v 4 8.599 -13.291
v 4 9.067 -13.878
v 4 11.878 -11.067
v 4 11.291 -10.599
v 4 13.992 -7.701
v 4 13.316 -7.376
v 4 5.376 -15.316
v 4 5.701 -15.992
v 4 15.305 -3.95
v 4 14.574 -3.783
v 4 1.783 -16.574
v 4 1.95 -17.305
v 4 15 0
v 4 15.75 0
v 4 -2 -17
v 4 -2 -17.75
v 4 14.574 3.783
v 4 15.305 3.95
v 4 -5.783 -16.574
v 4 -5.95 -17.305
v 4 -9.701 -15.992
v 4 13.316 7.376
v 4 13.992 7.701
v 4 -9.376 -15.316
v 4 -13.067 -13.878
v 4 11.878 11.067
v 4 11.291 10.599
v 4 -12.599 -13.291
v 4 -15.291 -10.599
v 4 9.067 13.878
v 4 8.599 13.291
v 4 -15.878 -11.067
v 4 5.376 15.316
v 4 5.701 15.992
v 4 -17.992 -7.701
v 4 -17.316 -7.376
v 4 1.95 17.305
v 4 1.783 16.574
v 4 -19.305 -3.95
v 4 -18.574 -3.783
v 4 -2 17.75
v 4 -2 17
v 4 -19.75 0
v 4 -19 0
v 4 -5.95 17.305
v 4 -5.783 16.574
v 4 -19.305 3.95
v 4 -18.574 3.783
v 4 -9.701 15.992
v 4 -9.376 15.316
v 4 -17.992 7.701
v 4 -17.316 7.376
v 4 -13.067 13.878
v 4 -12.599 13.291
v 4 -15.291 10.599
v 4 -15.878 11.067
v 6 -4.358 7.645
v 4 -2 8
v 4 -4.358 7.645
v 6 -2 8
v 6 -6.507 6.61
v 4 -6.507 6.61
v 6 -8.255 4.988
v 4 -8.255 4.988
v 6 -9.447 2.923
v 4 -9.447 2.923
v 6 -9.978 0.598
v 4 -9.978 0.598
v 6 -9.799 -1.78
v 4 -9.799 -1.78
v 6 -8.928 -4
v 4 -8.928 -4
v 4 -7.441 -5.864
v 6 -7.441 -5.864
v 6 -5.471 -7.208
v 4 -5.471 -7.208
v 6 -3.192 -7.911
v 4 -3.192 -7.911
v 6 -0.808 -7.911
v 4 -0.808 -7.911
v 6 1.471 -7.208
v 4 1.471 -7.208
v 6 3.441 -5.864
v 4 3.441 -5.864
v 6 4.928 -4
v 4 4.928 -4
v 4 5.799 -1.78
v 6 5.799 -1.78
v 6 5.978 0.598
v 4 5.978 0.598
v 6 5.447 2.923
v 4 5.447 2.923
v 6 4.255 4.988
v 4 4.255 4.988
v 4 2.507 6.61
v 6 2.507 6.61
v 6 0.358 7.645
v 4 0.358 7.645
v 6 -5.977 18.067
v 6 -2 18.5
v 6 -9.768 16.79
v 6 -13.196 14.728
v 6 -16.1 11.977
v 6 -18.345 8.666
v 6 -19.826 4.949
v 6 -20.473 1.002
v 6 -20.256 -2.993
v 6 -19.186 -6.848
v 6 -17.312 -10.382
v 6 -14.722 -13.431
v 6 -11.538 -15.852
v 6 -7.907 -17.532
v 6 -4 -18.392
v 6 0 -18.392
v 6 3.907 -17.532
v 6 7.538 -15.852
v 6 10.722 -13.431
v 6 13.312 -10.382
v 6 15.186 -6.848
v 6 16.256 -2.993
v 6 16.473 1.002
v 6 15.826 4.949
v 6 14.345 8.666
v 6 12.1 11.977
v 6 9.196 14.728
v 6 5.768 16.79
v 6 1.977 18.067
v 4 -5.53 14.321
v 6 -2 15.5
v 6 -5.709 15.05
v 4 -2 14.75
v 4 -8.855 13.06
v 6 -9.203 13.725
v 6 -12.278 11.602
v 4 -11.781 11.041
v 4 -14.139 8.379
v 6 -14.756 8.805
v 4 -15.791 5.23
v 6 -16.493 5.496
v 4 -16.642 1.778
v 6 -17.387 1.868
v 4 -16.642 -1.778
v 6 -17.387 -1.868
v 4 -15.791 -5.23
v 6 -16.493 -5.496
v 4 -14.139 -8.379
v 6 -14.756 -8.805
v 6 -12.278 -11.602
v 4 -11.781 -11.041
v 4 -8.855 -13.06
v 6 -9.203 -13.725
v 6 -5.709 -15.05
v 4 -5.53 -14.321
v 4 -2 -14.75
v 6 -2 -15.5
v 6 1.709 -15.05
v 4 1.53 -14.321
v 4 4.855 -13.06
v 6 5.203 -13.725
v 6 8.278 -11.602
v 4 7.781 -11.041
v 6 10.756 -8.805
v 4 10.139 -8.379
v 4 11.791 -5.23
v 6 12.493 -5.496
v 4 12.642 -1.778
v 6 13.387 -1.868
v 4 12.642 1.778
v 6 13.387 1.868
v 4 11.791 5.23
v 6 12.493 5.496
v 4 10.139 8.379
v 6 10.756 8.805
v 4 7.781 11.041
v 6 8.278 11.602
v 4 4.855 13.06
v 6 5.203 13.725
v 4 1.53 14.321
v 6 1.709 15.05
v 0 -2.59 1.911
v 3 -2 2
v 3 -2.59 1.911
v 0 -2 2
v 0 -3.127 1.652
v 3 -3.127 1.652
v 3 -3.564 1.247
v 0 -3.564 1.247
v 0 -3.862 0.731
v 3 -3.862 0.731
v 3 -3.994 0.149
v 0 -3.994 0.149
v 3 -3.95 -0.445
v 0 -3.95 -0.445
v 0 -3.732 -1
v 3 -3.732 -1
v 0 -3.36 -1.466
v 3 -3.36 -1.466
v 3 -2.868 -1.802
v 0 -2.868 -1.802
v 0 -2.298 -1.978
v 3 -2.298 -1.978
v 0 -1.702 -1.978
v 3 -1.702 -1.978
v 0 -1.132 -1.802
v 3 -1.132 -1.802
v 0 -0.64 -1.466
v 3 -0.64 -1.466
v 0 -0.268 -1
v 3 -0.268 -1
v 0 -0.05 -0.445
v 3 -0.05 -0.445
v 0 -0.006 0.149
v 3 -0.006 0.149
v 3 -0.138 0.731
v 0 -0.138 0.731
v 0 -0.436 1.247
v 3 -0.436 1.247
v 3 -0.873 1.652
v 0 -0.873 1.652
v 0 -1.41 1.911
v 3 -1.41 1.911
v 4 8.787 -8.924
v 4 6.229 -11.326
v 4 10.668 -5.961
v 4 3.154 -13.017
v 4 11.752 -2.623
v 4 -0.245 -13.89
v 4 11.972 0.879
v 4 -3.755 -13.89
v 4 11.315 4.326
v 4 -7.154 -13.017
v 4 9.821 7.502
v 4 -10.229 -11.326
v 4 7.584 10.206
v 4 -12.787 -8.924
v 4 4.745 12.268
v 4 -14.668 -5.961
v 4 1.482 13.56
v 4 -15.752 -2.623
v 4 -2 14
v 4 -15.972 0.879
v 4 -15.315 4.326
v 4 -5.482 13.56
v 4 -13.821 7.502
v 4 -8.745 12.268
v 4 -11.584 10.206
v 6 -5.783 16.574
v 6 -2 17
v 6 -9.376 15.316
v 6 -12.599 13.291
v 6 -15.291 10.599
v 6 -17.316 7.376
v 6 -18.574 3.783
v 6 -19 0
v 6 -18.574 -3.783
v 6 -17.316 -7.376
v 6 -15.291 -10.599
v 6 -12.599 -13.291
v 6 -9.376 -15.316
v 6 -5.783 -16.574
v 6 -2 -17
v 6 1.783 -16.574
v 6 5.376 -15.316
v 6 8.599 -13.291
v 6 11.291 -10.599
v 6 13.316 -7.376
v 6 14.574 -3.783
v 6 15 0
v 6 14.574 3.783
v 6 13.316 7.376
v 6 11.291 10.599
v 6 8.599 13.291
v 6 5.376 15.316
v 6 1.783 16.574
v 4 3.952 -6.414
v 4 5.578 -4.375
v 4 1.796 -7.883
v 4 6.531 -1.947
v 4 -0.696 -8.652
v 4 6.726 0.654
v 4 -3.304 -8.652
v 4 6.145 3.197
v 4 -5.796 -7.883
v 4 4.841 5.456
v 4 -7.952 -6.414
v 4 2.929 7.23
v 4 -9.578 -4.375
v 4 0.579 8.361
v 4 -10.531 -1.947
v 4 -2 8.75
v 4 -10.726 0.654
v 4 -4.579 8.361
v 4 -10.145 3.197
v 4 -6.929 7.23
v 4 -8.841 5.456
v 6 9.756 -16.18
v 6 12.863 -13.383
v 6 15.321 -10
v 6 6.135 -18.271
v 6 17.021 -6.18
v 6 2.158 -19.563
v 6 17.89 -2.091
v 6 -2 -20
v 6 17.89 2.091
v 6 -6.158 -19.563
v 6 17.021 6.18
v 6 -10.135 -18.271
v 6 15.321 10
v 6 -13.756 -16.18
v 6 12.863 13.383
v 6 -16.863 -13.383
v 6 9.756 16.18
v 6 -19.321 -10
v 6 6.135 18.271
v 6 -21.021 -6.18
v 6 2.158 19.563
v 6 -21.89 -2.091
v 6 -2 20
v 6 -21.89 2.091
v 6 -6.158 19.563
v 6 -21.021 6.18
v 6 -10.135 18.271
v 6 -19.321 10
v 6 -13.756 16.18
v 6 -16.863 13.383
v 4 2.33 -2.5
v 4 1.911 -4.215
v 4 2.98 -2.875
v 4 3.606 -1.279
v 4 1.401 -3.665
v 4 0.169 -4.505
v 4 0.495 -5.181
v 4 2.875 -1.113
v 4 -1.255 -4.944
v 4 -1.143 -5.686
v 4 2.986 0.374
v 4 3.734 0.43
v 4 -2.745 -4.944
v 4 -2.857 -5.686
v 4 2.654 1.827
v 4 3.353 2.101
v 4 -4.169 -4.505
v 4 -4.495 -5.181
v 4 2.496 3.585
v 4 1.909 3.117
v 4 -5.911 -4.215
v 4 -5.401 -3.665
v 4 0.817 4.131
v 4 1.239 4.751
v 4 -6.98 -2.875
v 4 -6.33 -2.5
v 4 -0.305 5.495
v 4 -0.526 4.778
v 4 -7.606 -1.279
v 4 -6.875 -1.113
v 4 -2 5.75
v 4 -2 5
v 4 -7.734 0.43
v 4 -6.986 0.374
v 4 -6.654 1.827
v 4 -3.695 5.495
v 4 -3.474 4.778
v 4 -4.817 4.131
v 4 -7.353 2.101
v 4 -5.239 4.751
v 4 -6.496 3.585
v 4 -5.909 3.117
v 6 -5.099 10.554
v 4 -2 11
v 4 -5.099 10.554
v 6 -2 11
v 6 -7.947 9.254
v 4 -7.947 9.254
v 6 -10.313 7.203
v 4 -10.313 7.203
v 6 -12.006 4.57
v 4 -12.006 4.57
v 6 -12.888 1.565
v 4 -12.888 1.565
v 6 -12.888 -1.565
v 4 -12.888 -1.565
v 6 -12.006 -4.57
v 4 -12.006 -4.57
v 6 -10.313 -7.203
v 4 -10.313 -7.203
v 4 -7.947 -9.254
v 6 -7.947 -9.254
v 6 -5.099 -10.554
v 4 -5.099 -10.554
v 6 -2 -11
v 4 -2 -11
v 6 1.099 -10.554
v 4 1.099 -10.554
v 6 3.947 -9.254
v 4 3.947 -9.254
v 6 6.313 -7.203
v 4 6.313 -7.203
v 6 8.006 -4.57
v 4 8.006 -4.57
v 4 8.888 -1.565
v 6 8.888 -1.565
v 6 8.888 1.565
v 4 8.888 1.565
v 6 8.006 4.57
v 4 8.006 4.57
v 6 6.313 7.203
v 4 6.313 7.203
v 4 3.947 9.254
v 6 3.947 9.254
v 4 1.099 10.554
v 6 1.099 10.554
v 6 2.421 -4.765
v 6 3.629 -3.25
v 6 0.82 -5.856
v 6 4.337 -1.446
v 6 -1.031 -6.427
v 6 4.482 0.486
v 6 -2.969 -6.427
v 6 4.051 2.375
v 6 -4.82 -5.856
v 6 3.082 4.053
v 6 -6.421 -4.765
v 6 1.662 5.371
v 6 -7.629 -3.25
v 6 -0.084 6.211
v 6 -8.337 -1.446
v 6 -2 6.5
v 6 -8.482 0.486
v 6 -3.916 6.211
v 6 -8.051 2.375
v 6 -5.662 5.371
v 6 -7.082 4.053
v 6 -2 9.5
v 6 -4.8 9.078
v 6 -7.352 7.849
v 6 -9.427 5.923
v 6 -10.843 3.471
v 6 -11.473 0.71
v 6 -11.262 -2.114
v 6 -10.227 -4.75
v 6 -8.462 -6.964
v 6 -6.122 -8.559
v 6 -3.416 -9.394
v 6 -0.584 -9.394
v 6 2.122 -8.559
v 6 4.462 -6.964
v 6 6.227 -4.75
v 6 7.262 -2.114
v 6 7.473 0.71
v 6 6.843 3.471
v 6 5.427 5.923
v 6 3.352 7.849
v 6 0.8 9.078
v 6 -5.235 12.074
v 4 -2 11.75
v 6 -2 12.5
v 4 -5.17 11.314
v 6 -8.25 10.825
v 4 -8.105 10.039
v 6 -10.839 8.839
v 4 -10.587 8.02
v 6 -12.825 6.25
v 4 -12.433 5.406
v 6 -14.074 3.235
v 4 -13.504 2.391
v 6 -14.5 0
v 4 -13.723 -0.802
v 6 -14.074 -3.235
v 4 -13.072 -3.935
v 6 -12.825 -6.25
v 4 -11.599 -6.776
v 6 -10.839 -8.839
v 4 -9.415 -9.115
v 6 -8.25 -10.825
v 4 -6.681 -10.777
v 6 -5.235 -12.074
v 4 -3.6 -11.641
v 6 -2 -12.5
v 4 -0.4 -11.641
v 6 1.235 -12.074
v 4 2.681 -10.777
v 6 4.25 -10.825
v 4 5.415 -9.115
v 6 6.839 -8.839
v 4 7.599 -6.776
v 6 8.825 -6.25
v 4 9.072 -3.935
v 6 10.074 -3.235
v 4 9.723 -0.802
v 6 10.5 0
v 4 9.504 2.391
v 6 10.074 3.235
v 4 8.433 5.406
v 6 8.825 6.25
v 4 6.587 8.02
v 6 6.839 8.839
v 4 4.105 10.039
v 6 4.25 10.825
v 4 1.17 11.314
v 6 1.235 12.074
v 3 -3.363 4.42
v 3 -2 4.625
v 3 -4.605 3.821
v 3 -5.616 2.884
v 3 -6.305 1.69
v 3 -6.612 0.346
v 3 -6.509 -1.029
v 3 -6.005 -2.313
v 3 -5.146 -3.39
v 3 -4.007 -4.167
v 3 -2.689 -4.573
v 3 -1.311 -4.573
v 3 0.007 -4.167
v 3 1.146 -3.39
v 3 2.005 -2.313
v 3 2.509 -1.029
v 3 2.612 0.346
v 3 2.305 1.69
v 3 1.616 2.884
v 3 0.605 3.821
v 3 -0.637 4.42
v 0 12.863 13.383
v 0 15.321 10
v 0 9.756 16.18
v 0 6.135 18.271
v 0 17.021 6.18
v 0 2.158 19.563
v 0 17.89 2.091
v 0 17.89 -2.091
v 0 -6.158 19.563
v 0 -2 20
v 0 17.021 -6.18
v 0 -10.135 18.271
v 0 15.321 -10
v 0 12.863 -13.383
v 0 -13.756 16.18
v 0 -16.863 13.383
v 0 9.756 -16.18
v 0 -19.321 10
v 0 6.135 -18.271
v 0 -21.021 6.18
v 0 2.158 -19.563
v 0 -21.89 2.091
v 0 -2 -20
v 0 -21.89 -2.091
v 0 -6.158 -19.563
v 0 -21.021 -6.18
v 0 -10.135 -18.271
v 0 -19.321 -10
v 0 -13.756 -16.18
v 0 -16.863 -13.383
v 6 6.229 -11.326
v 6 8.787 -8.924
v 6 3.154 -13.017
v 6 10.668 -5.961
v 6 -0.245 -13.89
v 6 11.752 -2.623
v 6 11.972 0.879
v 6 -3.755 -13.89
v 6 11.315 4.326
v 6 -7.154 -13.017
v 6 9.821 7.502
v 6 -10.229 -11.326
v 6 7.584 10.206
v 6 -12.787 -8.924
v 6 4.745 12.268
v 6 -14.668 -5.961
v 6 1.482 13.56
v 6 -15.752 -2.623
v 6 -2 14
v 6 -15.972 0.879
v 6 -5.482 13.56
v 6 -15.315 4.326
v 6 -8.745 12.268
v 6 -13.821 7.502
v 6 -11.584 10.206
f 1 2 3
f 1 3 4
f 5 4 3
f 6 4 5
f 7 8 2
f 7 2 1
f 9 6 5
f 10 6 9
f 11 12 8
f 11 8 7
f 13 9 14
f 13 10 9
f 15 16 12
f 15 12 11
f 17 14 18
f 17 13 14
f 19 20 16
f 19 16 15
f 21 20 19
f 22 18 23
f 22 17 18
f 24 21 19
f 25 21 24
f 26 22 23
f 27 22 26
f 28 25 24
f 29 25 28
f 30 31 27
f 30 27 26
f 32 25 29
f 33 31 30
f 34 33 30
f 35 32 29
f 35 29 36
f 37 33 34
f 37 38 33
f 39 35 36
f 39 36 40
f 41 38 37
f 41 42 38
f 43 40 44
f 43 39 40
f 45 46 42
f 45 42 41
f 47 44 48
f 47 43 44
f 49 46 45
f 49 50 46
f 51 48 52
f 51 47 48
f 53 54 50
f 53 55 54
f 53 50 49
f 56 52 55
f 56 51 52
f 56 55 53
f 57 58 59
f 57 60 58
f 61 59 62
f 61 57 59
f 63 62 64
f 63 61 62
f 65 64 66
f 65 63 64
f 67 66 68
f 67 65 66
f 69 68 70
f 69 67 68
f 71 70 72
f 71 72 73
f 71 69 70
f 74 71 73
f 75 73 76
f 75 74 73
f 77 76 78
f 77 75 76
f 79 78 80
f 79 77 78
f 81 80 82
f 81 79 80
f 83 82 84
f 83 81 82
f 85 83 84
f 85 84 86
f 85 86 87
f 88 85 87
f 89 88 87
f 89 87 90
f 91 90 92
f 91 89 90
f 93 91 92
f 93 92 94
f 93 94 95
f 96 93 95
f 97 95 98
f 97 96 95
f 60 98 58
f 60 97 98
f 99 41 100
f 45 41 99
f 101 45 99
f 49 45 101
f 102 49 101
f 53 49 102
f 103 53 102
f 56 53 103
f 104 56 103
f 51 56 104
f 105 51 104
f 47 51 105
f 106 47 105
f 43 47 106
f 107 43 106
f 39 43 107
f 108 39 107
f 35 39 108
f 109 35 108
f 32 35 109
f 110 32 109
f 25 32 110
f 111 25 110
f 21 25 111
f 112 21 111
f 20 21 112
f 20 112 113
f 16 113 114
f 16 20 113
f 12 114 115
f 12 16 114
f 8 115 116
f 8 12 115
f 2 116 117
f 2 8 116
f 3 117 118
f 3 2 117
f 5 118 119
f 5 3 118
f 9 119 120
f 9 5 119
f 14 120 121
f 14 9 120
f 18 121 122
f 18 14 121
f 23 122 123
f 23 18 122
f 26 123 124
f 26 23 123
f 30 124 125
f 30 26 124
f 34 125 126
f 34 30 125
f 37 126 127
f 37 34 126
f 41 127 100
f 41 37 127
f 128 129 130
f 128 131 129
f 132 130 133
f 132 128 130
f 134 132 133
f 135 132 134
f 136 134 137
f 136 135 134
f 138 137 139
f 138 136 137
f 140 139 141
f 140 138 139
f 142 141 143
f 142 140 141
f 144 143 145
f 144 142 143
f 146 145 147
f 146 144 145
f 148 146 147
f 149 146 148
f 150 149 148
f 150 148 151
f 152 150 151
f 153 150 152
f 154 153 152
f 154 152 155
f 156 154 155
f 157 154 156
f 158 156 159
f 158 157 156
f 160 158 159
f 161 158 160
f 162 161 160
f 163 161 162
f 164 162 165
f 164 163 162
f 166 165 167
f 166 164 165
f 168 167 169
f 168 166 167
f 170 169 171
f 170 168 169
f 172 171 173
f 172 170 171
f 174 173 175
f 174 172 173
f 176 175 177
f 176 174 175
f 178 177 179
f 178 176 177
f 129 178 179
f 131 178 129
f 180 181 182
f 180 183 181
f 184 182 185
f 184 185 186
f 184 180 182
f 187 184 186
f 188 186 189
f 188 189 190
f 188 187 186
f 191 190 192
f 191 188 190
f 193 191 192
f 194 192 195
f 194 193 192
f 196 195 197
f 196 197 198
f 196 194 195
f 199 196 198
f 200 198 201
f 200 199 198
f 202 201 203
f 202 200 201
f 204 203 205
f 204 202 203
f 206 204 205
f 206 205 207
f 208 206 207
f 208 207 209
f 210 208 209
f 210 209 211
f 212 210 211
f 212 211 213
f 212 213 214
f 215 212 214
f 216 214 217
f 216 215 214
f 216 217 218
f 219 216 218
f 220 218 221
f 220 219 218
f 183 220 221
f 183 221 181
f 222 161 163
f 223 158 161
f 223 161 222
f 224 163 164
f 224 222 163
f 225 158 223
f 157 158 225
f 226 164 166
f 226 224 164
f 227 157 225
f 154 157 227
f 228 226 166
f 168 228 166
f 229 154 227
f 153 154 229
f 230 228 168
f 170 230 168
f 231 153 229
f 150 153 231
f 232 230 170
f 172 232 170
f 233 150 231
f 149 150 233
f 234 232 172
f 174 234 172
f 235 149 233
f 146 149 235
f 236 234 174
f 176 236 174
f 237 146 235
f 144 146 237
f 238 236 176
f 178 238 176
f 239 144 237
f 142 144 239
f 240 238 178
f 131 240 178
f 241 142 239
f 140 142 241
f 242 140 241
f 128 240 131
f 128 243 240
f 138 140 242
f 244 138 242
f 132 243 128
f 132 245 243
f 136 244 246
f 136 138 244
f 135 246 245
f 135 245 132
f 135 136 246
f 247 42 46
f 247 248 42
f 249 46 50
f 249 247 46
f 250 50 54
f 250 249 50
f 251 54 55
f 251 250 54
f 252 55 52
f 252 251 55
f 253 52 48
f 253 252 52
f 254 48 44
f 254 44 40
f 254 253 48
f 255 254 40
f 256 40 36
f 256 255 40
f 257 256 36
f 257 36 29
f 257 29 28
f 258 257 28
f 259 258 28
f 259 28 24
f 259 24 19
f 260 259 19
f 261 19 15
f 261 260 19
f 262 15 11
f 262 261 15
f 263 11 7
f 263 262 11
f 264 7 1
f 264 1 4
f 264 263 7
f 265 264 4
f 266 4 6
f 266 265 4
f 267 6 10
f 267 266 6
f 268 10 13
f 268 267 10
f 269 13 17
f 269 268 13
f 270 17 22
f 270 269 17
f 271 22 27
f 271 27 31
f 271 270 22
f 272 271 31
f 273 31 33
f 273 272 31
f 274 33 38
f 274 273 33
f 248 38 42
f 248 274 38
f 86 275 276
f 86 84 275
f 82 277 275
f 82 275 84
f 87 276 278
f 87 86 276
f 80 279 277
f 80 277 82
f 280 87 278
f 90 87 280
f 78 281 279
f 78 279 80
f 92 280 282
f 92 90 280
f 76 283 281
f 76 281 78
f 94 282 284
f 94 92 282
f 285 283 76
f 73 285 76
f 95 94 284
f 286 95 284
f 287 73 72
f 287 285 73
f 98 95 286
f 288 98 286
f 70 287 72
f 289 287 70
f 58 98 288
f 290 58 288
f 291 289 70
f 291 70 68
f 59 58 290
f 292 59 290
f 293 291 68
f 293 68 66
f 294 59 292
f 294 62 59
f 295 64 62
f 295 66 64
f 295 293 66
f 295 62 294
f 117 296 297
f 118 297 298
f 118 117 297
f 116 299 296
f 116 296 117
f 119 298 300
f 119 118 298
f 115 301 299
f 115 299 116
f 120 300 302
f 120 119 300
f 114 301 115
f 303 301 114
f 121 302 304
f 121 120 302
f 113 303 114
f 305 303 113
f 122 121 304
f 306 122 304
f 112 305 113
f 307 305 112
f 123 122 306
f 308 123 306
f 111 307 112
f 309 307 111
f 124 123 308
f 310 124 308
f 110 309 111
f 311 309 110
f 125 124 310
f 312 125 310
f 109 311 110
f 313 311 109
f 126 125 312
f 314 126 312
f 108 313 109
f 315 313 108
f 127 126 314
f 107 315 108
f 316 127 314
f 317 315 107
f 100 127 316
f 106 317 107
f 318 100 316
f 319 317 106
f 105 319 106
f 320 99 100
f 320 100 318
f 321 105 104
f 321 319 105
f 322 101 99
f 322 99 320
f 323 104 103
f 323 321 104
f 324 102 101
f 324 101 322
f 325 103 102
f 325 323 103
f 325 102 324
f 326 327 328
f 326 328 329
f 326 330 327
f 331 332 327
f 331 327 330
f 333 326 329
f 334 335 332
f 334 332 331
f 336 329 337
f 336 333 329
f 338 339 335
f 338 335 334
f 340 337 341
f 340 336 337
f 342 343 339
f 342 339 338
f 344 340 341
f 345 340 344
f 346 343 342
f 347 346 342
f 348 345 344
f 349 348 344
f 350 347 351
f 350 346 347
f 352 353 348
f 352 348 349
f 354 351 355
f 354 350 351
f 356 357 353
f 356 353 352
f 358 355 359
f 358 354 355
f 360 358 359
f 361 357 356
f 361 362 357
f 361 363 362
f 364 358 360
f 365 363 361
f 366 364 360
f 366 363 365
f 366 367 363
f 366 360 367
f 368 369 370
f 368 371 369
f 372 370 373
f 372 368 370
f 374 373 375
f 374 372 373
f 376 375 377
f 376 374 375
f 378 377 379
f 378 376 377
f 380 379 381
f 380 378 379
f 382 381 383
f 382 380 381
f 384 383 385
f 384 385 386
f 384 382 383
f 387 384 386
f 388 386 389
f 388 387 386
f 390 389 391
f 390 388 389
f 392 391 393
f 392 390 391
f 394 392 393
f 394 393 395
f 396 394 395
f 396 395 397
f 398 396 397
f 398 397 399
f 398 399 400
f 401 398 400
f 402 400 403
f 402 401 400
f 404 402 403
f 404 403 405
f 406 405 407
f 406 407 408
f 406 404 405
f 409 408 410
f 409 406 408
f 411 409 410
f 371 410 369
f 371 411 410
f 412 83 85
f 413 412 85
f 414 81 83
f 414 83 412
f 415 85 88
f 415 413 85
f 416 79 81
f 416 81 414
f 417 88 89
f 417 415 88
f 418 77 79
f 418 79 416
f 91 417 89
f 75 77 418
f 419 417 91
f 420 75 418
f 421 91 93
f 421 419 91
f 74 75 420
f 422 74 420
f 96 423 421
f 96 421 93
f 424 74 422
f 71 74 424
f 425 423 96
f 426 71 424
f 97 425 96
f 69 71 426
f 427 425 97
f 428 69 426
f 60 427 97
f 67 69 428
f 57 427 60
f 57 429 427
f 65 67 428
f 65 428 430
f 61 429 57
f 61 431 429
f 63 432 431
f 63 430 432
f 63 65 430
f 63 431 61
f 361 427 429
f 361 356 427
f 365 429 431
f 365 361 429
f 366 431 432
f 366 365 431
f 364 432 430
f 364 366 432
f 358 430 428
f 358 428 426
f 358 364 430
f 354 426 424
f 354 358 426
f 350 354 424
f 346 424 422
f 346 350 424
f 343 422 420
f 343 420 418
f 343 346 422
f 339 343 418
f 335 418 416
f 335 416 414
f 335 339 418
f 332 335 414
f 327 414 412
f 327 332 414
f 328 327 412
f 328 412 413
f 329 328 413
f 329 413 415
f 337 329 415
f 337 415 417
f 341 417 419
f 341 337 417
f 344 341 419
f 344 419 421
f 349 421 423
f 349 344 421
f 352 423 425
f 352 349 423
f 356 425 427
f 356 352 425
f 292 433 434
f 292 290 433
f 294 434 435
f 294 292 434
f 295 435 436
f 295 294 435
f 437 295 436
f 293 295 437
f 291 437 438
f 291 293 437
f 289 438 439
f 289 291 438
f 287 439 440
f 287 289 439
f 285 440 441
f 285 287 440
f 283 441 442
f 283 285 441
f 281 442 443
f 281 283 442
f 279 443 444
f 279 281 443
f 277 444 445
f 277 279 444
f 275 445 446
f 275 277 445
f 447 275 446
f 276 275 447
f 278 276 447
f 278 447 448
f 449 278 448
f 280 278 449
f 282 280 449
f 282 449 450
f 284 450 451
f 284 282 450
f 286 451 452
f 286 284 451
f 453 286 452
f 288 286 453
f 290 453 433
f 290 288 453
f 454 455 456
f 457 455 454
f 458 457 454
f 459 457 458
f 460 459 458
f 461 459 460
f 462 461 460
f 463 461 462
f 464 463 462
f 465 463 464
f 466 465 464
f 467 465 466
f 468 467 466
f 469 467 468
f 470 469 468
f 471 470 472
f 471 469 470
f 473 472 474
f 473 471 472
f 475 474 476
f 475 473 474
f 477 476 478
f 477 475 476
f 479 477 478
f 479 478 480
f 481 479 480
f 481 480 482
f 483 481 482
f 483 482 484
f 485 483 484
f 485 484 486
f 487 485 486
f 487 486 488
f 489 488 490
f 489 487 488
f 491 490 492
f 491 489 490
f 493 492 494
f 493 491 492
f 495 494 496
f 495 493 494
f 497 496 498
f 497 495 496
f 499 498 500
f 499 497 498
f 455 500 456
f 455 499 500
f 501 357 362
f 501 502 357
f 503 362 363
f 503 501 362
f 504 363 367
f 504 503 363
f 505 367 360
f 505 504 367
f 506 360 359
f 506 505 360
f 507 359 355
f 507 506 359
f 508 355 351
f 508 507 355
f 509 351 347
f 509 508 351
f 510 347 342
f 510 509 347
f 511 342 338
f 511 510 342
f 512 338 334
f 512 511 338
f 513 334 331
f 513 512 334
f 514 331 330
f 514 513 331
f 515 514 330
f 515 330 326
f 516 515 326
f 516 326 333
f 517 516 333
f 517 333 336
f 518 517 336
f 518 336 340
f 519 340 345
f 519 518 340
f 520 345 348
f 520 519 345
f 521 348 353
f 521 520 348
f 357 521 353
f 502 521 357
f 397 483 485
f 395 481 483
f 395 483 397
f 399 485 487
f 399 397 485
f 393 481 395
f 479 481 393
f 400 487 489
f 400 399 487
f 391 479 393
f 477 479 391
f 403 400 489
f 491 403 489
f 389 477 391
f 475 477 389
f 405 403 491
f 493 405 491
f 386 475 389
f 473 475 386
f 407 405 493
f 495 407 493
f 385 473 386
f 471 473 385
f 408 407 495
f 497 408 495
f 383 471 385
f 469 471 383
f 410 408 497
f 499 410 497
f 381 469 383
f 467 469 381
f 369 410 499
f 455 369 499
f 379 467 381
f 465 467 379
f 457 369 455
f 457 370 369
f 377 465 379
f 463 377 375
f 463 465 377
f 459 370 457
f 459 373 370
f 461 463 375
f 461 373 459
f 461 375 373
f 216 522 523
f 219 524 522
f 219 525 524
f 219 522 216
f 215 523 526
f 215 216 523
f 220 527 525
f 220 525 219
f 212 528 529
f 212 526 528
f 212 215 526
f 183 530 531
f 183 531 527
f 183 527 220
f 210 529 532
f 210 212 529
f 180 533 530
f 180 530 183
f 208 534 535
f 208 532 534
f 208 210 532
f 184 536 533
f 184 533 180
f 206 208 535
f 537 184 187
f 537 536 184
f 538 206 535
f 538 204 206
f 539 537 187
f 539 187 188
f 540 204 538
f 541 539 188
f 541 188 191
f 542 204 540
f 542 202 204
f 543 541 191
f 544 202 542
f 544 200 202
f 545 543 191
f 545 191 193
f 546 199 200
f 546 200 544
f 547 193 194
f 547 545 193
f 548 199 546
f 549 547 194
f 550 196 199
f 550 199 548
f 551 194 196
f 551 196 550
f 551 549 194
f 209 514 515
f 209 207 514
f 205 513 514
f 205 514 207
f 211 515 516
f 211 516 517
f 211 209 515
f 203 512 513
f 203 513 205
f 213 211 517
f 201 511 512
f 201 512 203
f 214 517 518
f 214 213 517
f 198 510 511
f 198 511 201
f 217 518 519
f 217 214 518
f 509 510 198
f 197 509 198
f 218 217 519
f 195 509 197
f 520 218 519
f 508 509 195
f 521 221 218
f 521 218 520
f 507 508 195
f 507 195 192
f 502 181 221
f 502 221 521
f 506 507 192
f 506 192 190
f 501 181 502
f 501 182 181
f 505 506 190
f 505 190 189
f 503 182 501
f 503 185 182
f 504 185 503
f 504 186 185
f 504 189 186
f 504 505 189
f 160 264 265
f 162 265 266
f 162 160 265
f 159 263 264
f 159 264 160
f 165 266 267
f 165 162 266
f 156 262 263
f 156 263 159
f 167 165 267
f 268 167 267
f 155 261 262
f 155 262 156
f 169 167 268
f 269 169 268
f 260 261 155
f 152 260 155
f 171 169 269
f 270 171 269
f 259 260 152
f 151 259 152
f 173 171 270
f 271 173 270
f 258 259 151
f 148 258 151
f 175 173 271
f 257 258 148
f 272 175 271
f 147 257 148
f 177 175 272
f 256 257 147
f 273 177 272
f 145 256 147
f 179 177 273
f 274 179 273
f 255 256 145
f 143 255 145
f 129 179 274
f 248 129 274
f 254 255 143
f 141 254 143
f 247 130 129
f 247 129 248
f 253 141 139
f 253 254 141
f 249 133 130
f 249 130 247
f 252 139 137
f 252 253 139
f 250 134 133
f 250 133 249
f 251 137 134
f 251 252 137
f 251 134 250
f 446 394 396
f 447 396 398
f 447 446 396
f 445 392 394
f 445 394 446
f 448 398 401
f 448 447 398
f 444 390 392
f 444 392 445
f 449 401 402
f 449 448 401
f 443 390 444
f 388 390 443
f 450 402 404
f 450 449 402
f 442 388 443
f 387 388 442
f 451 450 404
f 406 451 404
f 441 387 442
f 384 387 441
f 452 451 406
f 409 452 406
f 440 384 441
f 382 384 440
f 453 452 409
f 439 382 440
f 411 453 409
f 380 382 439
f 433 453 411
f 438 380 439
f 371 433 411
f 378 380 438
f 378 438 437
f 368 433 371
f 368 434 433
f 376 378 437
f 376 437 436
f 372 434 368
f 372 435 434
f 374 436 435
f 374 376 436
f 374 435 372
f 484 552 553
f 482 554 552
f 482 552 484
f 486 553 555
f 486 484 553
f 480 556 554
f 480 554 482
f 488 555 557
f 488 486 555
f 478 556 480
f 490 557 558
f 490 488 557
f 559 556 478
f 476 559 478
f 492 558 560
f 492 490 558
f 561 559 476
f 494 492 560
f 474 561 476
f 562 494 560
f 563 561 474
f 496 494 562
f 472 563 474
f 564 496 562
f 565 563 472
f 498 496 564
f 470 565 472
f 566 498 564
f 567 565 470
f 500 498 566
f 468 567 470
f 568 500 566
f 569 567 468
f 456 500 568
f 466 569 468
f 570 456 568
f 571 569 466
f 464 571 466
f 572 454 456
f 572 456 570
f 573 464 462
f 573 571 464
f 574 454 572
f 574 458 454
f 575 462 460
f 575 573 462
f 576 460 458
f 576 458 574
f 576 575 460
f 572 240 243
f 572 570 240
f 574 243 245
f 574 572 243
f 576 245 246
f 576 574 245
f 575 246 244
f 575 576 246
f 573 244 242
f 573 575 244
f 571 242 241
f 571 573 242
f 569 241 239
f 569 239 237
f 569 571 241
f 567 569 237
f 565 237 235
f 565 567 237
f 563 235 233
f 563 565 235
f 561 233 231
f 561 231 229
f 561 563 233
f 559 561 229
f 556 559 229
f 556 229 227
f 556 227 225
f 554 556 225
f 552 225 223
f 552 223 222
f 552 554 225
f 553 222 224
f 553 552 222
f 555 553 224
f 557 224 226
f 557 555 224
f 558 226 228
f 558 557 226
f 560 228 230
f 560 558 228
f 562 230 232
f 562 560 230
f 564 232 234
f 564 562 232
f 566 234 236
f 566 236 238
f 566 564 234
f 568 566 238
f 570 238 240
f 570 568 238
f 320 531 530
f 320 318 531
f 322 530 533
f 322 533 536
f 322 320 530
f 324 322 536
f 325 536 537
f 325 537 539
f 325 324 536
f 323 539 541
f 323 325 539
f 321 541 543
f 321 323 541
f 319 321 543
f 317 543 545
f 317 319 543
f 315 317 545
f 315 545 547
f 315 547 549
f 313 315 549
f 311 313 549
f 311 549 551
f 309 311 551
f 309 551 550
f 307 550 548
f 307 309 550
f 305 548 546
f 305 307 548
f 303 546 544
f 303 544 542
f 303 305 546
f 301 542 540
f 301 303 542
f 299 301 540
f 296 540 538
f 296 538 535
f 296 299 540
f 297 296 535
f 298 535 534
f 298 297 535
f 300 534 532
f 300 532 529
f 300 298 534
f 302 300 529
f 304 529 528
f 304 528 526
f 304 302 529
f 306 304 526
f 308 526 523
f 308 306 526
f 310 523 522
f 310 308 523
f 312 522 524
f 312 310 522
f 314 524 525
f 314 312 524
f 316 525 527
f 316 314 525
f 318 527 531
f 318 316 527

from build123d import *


with BuildPart() as part:
    # Schizzo3 → Rivoluzione1 (revolve)
    with BuildSketch(Plane.XY, mode=Mode.PRIVATE) as rivoluzione1_sk:
        Polygon((0, 0), (0, 18), (6, 18), (6, 16.5), (4, 15.75), (4, 15), (6, 15), (6, 13.5), (4, 12.75), (4, 12), (6, 12), (6, 10.5), (4, 9.75), (4, 9), (6, 9), (6, 7.5), (4, 6.75), (4, 6), (6, 6), (6, 4.5), (4, 3.75), (4, 3), (3, 2.625), (3, 0), align=None)
    revolve(rivoluzione1_sk.sketch.rotate(Axis((-0.664443358, -2, 0), (1, 0, 0)), 90), axis=Axis((-0.664443358, -2, 0), (1, 0, 0)))


solid = part.part
